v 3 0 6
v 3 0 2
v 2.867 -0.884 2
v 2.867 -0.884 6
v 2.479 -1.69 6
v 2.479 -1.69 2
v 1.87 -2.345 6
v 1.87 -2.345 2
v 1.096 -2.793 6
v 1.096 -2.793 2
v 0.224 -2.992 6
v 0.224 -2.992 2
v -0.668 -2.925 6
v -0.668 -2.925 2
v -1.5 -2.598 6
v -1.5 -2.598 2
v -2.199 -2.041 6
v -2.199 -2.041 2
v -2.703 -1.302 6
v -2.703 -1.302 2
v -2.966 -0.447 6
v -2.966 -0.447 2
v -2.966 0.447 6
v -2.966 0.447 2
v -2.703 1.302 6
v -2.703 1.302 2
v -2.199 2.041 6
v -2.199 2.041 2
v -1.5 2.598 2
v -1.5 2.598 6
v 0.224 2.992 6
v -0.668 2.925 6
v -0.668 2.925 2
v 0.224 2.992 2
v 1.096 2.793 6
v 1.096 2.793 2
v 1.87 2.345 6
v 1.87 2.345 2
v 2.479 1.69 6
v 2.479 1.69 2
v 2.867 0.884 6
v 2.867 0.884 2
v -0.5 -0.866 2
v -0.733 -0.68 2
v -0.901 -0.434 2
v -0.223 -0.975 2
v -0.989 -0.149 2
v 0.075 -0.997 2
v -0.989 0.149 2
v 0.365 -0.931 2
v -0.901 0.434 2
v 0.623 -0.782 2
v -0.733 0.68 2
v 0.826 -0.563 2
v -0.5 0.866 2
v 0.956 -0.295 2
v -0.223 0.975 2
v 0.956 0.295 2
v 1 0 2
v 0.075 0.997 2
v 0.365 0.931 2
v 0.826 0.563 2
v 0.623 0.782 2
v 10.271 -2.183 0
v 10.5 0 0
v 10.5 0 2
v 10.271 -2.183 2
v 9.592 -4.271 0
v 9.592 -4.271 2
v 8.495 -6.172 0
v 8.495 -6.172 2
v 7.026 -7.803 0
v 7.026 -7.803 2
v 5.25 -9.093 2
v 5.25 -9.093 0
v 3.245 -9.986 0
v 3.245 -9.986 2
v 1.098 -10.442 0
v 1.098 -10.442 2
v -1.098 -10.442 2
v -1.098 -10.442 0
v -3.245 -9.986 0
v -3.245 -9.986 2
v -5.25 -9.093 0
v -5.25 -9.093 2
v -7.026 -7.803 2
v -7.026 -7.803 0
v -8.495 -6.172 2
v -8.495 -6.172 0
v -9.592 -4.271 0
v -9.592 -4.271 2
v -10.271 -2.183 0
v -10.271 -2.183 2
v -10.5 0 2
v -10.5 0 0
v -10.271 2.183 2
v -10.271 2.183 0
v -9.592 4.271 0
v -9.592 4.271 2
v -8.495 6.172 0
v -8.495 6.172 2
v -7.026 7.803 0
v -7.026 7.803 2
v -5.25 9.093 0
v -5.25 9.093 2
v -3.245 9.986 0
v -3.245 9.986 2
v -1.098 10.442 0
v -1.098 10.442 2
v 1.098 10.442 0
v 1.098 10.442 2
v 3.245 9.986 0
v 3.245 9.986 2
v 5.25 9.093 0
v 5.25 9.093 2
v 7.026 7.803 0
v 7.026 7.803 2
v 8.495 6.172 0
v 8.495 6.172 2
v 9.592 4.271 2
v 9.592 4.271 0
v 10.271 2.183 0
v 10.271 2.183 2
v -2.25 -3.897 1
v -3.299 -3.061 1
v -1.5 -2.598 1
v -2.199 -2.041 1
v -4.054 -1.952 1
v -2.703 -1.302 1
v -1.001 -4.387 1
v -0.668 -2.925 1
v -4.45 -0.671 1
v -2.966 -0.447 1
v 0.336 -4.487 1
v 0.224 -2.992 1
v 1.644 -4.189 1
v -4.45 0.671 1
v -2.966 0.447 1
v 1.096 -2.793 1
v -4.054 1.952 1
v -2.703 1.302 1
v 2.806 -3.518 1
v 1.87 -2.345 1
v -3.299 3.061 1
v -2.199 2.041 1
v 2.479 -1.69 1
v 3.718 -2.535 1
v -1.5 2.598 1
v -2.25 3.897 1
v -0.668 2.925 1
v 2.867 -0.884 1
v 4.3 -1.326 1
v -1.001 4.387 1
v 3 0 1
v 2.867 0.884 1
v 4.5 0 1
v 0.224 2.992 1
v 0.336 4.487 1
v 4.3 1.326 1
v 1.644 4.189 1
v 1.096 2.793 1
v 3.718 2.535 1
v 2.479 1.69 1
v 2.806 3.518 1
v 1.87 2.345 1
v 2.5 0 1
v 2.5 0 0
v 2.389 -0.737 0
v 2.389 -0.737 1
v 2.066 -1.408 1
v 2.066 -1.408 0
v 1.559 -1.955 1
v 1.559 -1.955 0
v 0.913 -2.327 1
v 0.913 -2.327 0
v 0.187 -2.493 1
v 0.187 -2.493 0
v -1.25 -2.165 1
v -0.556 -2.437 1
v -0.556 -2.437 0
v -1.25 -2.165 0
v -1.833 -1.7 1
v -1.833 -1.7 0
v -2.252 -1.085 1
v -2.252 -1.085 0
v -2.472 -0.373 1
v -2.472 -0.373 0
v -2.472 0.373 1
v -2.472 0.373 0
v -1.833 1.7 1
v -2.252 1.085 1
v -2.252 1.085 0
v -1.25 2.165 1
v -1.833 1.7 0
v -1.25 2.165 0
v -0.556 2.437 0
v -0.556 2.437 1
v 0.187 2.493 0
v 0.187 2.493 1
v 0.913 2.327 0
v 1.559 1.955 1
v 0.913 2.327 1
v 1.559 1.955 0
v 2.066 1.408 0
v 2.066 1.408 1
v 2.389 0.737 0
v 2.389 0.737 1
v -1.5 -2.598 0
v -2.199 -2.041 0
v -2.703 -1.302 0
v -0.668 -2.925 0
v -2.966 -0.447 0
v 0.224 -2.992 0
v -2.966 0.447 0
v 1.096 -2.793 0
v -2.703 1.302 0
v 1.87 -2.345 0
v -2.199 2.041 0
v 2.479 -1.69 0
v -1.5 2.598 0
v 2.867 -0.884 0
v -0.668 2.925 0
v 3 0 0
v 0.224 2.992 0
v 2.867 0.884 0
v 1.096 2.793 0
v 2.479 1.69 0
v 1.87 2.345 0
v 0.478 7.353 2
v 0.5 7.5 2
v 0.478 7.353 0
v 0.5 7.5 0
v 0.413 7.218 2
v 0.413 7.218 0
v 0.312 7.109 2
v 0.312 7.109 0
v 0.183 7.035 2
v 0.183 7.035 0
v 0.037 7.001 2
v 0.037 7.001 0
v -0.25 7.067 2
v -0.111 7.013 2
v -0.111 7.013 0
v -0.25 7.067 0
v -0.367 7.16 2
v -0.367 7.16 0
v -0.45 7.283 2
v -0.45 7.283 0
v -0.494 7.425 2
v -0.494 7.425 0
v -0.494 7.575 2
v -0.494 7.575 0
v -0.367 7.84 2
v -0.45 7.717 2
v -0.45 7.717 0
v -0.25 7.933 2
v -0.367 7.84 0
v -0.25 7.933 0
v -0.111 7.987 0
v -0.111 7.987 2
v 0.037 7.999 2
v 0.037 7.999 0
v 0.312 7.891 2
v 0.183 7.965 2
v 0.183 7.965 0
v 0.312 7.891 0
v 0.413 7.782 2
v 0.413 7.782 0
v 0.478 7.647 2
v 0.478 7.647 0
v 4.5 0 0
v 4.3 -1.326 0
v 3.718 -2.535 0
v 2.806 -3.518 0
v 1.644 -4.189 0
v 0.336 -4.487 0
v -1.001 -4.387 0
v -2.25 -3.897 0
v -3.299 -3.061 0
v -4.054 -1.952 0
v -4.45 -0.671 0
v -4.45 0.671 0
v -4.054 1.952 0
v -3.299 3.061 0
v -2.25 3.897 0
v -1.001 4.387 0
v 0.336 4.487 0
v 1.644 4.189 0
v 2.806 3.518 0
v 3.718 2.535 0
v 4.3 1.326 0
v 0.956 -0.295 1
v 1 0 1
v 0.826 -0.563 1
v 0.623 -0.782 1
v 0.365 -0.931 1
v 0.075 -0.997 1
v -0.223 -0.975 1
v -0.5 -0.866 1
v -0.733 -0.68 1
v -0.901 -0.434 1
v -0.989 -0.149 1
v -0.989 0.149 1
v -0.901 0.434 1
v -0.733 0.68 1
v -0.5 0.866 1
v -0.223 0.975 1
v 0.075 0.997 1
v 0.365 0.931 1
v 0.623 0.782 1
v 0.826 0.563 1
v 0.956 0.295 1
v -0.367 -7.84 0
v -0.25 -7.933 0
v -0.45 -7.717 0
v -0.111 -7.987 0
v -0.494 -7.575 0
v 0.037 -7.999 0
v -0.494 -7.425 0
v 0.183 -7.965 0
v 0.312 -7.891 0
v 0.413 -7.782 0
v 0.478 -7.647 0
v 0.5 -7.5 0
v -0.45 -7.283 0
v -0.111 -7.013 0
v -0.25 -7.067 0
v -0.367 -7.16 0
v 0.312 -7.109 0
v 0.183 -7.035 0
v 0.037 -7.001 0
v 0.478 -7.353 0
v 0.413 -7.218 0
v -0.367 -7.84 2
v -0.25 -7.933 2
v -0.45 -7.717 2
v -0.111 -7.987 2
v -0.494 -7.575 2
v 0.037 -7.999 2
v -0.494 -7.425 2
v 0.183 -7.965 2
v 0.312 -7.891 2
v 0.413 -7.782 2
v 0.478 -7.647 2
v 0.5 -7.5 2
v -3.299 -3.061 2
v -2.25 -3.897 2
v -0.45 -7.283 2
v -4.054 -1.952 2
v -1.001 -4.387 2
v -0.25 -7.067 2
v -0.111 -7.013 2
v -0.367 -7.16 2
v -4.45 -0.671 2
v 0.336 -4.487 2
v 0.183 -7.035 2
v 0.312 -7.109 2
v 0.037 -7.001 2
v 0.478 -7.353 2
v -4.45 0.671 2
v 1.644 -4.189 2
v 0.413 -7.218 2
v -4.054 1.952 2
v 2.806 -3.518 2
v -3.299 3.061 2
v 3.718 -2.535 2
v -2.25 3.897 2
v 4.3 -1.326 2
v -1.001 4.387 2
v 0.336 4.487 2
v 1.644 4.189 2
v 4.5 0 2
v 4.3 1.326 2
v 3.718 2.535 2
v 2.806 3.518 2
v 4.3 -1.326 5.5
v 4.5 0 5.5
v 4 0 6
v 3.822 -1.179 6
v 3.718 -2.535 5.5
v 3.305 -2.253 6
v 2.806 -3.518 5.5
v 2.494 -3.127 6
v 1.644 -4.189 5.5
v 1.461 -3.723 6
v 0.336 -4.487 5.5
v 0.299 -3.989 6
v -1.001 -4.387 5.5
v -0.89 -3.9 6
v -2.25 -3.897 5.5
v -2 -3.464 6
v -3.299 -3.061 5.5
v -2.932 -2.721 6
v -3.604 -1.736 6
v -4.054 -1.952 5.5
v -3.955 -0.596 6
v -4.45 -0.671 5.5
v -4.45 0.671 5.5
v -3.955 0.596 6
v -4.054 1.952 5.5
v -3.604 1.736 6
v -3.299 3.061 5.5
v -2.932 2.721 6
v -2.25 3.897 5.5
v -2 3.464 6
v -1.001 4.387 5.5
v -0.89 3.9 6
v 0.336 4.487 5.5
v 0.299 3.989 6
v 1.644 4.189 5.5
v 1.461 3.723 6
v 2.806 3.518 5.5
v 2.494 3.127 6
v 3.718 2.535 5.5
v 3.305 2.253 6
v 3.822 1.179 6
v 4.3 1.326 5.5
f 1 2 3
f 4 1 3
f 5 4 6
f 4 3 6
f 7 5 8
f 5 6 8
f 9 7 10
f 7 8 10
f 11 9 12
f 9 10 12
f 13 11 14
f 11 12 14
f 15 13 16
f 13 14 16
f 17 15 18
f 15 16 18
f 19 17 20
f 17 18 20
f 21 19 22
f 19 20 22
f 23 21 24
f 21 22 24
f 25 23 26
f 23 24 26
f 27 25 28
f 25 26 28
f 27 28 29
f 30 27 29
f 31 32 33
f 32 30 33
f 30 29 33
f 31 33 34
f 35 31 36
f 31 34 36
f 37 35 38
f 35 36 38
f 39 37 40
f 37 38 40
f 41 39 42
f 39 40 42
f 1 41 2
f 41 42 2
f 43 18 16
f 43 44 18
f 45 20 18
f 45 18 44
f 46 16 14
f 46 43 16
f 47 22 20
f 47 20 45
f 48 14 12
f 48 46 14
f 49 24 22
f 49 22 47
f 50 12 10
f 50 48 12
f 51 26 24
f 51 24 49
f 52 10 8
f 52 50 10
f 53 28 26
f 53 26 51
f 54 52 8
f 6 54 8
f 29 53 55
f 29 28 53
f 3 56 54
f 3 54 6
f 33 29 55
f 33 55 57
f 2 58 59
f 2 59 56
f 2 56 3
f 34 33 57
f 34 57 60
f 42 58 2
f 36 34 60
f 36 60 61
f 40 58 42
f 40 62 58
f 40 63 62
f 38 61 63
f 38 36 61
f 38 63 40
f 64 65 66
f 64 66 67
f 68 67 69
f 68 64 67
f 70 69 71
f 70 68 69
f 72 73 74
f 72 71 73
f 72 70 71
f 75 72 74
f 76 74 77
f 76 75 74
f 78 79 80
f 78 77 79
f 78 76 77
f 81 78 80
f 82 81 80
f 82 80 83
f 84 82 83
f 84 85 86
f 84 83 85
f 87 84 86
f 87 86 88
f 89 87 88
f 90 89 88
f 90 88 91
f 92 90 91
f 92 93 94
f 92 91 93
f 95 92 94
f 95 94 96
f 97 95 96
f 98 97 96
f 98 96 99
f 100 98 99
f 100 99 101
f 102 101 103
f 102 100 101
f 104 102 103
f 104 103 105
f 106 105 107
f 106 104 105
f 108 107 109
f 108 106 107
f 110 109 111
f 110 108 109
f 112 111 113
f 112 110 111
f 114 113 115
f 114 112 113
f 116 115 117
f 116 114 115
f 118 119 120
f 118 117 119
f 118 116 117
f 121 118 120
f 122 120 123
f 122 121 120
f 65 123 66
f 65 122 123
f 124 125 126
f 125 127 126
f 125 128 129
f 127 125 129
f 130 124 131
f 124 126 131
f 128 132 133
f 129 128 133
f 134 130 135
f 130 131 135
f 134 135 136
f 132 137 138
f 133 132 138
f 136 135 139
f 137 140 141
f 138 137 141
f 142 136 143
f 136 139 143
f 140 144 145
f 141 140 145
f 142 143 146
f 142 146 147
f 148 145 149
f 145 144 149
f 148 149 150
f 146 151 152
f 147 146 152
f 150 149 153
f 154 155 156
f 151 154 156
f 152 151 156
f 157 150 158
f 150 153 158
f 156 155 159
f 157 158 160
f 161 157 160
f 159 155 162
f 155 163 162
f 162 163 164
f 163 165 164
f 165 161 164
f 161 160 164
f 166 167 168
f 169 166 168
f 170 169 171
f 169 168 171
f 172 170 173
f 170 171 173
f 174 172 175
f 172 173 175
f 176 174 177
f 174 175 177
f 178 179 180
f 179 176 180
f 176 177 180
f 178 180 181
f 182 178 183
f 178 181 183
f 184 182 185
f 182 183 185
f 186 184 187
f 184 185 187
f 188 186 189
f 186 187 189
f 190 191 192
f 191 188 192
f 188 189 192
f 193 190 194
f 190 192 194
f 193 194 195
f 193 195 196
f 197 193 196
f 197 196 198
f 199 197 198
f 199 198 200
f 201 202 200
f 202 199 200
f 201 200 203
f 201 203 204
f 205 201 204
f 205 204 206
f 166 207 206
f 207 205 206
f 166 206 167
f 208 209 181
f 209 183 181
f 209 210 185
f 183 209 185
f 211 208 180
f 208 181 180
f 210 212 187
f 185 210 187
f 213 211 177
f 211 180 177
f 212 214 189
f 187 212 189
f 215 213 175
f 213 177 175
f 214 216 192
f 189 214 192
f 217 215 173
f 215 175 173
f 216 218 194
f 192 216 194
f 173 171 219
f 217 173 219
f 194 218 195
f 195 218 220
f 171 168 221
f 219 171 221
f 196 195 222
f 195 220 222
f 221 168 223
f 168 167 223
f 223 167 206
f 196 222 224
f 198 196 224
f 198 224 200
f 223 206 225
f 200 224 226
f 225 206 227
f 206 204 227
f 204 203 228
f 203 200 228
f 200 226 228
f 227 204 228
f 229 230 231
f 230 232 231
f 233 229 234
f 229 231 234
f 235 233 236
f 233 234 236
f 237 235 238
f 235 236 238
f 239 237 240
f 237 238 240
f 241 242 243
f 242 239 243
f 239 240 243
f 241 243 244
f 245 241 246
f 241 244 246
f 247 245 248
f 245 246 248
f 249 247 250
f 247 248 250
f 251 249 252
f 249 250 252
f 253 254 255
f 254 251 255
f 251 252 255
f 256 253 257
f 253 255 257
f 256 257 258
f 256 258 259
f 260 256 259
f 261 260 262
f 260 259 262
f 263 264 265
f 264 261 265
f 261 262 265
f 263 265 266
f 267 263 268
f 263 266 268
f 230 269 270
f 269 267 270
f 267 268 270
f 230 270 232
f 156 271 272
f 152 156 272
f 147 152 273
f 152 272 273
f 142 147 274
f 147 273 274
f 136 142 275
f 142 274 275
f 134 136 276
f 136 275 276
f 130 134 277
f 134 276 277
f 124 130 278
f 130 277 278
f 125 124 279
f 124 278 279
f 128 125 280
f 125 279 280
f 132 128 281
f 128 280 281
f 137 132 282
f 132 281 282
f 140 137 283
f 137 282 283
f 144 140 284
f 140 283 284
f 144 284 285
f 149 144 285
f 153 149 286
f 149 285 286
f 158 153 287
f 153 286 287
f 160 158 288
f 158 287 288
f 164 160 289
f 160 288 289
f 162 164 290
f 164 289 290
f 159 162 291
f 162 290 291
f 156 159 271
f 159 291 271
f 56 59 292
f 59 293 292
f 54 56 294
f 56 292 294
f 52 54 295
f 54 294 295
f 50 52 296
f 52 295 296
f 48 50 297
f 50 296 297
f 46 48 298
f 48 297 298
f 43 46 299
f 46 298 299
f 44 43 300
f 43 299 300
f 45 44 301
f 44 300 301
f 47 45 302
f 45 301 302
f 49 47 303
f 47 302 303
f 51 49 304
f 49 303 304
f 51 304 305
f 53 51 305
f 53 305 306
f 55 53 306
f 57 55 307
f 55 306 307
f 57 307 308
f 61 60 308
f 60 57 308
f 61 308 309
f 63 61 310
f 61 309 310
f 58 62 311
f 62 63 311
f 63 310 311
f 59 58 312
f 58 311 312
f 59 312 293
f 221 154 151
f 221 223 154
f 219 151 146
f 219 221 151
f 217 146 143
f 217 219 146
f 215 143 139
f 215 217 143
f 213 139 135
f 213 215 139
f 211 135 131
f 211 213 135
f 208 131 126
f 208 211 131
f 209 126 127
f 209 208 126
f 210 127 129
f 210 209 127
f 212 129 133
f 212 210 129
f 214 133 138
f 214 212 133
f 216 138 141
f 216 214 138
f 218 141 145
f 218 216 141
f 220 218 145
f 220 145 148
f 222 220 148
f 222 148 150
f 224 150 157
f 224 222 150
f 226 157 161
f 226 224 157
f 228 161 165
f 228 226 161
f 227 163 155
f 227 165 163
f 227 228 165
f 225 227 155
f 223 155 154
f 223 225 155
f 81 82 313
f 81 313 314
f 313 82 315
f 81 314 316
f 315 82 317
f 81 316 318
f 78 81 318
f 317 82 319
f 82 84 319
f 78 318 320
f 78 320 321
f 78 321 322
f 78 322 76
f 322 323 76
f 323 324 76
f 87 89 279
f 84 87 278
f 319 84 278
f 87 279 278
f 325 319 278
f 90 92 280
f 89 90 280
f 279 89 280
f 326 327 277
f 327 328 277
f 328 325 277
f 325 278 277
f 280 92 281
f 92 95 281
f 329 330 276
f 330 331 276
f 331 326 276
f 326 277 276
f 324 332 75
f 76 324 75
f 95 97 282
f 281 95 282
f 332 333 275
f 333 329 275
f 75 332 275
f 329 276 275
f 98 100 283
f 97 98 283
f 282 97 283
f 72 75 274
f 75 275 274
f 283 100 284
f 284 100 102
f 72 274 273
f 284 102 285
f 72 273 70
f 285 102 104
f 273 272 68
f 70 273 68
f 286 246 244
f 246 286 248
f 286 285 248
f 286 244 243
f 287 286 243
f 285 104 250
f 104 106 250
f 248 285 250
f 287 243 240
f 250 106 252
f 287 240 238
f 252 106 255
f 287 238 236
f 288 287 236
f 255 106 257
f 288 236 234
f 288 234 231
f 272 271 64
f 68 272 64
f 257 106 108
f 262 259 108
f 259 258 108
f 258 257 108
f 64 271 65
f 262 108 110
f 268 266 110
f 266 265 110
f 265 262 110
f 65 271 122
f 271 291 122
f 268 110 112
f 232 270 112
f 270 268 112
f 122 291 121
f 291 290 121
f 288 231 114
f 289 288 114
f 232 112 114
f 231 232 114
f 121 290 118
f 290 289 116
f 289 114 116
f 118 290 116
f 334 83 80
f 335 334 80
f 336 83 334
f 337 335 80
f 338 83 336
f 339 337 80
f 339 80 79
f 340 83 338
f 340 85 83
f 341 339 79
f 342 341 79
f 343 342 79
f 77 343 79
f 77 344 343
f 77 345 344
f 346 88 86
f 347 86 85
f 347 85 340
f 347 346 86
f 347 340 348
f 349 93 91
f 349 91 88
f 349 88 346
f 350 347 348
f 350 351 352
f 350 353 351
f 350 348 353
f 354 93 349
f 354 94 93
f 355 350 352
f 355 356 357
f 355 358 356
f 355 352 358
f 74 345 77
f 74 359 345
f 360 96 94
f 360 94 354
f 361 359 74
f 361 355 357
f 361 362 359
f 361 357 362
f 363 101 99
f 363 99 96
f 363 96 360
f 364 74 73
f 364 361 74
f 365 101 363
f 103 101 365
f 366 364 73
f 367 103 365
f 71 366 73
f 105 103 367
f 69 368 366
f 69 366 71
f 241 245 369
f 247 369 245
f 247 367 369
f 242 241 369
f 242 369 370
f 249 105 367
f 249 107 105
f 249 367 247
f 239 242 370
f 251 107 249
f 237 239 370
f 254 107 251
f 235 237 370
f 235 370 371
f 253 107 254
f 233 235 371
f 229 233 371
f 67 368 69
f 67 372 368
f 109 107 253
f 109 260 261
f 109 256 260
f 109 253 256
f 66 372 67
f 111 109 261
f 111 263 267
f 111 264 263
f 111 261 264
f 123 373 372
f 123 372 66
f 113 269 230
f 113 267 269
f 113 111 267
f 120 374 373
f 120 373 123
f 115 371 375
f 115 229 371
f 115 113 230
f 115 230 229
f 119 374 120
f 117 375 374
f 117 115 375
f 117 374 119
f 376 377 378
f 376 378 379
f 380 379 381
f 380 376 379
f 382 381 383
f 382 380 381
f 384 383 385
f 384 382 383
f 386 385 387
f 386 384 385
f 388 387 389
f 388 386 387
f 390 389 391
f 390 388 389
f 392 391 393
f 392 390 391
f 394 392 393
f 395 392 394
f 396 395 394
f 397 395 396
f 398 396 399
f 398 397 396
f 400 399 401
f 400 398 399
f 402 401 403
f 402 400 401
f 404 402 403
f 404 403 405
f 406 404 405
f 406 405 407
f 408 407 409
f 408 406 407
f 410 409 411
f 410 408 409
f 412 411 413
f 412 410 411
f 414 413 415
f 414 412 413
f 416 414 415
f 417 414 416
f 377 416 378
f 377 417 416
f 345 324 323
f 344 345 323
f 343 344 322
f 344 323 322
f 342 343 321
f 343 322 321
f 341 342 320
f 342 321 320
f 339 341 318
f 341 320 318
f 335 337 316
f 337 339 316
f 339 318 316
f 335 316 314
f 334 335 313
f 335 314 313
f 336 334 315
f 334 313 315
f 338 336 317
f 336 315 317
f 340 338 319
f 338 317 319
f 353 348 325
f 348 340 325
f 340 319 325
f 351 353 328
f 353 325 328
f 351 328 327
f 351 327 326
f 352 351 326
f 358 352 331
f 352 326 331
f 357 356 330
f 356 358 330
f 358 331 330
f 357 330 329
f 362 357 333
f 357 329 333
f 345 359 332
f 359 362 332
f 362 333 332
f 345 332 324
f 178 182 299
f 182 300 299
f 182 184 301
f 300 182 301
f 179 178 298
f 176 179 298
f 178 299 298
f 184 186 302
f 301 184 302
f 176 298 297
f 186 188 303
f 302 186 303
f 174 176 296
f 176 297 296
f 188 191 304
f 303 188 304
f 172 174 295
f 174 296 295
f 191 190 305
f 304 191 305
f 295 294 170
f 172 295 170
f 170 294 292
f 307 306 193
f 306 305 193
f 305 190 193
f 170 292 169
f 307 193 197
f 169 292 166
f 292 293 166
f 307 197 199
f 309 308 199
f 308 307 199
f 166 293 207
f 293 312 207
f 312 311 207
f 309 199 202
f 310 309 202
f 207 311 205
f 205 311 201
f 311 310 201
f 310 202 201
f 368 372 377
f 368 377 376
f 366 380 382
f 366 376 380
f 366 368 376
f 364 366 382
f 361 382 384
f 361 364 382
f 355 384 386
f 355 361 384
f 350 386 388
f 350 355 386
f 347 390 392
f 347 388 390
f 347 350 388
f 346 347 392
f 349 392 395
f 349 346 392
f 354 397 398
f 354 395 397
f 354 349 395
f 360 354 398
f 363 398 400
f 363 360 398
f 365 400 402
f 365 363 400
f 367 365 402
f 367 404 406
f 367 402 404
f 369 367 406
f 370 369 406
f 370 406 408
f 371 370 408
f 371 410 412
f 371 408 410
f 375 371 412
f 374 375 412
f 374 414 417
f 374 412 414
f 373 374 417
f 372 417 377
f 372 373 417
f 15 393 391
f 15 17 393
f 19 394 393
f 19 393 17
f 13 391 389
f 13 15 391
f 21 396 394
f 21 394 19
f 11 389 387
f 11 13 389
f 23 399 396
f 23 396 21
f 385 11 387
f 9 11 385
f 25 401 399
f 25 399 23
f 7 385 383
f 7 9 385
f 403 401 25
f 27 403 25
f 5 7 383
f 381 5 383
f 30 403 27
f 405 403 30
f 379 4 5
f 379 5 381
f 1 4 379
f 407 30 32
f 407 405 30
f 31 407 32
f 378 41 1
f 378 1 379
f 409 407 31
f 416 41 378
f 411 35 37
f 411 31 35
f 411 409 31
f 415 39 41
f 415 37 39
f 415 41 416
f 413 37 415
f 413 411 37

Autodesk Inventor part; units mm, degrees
ref_plane "YZ Plane" through (0, 0, 0) normal (1, 0, 0) x (0, 1, 0)
ref_plane "XZ Plane" through (0, 0, 0) normal (0, 1, 0) x (-1, 0, 0)
ref_plane "XY Plane" through (0, 0, 0) normal (0, 0, 1) x (1, 0, 0)
sketch "Sketch1" plane through (0, 0, 0) normal (0, 0, 1) x (1, 0, 0)
  circle A0 centre (0, 0) radius 10.5
  circle A1 centre (0, 0) radius 4.5
  circle A2 centre (0, 0) radius 3
  line L0 (-15, 0) -> (15, 0) construction
  line L1 (0, -19) -> (0, 21.6238) construction
  circle A3 centre (0, -7.5) radius 0.5
  circle A4 centre (0, 7.5) radius 0.5
  circle A5 centre (0, 0) radius 1
  circle A6 centre (0, 0) radius 2.5
  dimension "d0" = 21
  dimension "d1" = 9
  dimension "d2" = 6
  dimension "d3" = 1
  dimension "d4" = 7.5
  dimension "d5" = 2
  dimension "d6" = 5
extrude "Extrusion1" add sketch "Sketch1" along normal blind 6 contours A1
extrude "Extrusion2" add sketch "Sketch1" along normal blind 2 contours A0 | A2 | A6
extrude "Extrusion3" cut sketch "Sketch1" along normal blind 1 contours A1 | A6
chamfer "Chamfer1" distance 0.5 angle 45 1 edges at (-4.5, 0, 6)
properties part number "ServoHorn"
